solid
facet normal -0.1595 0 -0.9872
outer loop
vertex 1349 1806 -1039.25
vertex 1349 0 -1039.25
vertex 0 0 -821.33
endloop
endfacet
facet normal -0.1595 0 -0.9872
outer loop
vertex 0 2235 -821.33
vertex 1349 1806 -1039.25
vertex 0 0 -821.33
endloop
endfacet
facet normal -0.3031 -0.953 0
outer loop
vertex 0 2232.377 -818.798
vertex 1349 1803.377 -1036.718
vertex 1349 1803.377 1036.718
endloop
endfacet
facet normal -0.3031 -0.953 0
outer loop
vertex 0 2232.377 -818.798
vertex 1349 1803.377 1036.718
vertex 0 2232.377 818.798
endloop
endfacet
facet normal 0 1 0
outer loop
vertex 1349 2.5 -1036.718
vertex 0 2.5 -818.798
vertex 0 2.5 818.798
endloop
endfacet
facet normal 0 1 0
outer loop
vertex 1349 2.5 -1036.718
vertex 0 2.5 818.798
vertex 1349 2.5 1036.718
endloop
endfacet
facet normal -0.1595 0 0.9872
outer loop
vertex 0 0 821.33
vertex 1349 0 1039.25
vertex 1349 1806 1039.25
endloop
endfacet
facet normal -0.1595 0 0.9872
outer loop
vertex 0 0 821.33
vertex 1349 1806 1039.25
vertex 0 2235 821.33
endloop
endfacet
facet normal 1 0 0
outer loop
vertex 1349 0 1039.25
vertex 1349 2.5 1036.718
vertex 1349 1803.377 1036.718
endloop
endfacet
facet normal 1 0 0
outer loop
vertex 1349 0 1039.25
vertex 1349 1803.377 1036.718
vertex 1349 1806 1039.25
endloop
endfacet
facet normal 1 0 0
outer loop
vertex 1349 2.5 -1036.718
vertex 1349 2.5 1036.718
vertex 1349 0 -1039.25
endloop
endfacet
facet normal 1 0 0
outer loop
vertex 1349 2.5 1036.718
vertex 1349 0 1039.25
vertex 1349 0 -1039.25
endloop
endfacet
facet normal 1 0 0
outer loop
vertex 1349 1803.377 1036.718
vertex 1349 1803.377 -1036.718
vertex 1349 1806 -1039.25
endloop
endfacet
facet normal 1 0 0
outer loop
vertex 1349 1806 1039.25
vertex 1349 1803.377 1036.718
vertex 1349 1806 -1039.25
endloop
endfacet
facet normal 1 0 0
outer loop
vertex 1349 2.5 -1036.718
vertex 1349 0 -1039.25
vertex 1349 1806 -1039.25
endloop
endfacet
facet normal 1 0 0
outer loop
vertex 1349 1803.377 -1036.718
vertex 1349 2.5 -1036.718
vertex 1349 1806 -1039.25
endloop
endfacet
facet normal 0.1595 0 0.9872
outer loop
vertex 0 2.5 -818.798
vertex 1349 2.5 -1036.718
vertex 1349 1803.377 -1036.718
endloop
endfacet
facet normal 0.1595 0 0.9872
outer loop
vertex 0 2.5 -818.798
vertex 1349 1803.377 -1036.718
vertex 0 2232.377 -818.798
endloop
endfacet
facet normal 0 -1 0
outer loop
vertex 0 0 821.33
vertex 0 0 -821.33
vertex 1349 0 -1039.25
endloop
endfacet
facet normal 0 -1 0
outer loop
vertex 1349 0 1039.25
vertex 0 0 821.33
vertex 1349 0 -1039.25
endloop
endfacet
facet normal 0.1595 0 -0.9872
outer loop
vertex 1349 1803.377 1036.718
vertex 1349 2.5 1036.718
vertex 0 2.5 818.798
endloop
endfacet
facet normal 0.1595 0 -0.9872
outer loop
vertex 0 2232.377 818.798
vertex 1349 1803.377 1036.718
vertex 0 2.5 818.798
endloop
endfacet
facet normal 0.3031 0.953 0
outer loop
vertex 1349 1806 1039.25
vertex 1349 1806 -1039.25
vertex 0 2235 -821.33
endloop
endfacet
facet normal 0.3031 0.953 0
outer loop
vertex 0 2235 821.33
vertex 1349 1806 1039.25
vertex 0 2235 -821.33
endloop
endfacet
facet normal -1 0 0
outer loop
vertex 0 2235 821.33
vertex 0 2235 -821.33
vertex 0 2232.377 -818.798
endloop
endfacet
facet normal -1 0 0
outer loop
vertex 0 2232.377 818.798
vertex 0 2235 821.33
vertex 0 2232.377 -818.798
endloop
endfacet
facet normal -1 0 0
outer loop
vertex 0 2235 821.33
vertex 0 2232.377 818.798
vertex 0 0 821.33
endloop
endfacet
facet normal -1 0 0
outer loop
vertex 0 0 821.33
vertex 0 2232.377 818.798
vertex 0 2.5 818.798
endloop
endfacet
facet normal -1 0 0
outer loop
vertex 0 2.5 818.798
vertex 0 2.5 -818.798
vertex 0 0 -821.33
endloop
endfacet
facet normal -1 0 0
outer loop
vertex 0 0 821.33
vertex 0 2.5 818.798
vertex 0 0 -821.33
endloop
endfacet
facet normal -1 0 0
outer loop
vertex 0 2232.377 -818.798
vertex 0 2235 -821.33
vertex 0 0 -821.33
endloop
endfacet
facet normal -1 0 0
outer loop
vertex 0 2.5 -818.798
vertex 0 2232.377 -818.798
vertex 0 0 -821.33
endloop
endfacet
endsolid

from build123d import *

# Parameters (mm, degrees)
BOSS_EXTRUDE1_DEPTH      = 1039.25
BOSS_EXTRUDE1_DEPTH_BACK = 1039.25
CUT_EXTRUDE1_DEPTH       = 4942.25
SHELL2_T                 = -2.5


with BuildPart() as part:
    # Sketch1 → Boss-Extrude1 (new, two sides: drawn at the far end of the back side and taken through both)
    with BuildSketch(Plane.XY.offset(-BOSS_EXTRUDE1_DEPTH_BACK)):
        Polygon((0, 0), (1349, 0), (1349, 1806), (0, 2235), align=None)
    extrude(amount=BOSS_EXTRUDE1_DEPTH + BOSS_EXTRUDE1_DEPTH_BACK)

    # Sketch2 → Cut-Extrude1 (cut)
    with BuildSketch(Plane.XZ):
        Polygon((0, 821.33), (0, 1039.25), (1349, 1039.25), align=None)
        Polygon((0, -1039.25), (1349, -1039.25), (0, -821.33), align=None)
    extrude(amount=-CUT_EXTRUDE1_DEPTH, mode=Mode.SUBTRACT)

    # Shell2
    shell2_openings = [part.faces().sort_by_distance(p)[0] for p in [
        (1349, 903, 0),
        (0, 1117.5, 0),
    ]]
    offset(amount=SHELL2_T, openings=shell2_openings, kind=Kind.INTERSECTION)


solid = part.part
